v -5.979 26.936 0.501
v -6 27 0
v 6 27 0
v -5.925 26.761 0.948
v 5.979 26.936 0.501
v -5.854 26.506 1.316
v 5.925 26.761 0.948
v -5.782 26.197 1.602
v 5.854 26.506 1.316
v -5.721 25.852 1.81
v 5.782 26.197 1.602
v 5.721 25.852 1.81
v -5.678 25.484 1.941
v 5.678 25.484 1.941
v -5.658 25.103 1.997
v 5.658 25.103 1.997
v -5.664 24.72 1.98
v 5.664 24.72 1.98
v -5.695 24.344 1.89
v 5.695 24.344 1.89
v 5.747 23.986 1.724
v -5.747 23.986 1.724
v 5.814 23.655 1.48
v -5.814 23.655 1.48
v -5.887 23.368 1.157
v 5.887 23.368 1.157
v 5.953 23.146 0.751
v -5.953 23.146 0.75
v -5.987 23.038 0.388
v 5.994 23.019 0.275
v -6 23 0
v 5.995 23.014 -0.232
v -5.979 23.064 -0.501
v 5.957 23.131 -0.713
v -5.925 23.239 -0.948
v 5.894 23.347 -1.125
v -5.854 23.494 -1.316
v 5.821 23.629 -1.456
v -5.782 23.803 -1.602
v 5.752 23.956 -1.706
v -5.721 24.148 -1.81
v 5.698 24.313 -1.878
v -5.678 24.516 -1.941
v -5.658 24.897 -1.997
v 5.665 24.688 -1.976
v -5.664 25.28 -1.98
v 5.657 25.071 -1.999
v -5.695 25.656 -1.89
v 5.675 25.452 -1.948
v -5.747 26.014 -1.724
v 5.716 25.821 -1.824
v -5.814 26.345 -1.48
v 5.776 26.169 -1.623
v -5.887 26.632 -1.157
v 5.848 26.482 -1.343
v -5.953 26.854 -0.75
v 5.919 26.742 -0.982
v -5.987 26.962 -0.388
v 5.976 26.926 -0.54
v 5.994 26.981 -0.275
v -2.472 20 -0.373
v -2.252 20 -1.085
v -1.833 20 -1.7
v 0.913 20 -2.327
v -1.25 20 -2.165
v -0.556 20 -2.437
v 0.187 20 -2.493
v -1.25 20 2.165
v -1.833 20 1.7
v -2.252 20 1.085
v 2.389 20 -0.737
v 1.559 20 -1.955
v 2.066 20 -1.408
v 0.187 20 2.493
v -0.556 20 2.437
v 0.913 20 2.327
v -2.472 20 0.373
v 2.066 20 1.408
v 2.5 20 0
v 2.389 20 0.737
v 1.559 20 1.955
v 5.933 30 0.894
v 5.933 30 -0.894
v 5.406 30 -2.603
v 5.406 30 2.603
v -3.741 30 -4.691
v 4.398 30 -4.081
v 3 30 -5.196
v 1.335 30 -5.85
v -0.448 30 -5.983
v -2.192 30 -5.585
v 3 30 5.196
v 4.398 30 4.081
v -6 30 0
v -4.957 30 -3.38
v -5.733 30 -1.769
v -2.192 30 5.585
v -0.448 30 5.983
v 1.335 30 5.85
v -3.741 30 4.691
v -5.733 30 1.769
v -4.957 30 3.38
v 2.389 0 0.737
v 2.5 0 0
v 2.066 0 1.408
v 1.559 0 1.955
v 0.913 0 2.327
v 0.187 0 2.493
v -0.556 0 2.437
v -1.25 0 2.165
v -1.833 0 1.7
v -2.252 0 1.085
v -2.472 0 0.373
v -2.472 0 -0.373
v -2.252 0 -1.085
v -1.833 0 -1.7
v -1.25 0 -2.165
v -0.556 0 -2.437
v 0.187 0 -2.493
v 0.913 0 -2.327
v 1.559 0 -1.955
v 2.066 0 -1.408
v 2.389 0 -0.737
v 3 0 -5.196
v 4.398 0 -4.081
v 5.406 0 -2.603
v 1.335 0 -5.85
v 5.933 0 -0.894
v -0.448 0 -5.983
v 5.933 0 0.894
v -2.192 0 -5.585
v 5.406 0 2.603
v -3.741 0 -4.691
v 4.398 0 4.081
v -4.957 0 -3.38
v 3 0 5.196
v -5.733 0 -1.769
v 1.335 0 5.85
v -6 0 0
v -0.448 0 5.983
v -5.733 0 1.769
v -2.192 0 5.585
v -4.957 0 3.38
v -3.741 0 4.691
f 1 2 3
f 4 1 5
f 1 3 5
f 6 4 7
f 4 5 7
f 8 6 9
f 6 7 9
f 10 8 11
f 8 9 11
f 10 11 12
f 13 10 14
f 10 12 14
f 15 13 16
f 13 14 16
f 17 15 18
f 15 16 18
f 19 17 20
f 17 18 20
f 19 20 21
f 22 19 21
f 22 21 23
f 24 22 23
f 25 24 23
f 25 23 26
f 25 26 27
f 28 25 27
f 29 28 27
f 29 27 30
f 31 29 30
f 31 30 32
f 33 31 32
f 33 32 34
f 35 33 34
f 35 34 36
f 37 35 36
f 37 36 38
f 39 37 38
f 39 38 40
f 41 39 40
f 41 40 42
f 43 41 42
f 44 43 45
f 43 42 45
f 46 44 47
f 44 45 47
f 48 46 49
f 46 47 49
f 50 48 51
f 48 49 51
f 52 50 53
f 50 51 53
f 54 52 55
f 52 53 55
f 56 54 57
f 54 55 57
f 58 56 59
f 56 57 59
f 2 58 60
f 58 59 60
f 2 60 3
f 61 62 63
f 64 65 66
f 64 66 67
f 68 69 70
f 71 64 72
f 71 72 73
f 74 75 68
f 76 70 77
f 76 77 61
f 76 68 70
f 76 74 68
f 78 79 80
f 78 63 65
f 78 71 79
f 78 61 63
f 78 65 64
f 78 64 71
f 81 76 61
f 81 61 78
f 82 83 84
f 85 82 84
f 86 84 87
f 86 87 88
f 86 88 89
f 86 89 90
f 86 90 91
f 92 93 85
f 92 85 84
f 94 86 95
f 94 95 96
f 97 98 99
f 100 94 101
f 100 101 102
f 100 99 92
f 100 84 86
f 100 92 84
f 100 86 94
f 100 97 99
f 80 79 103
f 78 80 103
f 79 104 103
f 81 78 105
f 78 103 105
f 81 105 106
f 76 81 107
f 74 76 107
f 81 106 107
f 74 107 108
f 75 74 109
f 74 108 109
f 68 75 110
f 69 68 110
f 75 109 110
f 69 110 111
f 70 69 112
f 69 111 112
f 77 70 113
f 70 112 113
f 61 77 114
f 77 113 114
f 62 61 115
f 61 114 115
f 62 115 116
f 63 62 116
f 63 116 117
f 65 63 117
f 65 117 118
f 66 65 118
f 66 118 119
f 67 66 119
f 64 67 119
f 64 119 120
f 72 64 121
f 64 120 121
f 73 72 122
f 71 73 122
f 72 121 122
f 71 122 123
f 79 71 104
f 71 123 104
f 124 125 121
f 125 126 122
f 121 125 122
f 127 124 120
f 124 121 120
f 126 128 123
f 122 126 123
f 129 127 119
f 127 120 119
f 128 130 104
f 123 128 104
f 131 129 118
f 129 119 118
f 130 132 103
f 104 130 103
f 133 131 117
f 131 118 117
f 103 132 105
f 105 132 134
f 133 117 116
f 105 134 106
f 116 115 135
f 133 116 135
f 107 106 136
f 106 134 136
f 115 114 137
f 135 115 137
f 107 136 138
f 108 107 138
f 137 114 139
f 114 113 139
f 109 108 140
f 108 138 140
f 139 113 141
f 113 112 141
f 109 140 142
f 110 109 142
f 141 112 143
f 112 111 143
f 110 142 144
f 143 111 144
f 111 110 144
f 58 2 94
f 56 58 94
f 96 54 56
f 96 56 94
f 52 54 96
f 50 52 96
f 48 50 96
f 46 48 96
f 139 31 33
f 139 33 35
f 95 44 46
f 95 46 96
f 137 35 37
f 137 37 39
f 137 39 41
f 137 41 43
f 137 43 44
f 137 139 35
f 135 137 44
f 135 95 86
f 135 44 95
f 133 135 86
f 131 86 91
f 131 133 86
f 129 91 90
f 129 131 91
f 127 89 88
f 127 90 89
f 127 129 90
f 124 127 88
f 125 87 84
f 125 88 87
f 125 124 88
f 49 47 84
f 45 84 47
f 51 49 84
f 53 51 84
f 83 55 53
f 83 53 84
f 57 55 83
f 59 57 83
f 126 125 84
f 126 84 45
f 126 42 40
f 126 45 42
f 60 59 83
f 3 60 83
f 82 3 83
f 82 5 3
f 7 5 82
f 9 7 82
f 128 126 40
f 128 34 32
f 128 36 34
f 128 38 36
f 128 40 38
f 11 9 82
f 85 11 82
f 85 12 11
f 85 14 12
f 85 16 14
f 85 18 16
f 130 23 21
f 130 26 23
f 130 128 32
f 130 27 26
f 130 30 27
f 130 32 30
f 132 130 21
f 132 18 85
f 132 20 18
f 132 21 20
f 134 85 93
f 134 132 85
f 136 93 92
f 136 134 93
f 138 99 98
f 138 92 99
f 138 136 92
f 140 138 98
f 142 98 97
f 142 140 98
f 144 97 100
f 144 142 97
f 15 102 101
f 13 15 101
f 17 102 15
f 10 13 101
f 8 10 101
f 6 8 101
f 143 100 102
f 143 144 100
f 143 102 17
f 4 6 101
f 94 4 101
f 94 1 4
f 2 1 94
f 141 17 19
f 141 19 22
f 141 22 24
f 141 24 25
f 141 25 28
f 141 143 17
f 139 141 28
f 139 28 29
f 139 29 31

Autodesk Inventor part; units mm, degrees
ref_plane "YZ Plane" through (0, 0, 0) normal (1, 0, 0) x (0, 1, 0)
ref_plane "XZ Plane" through (0, 0, 0) normal (0, 1, 0) x (-1, 0, 0)
ref_plane "XY Plane" through (0, 0, 0) normal (0, 0, 1) x (1, 0, 0)
sketch "スケッチ1" plane through (0, 0, 0) normal (0, 1, 0) x (-1, 0, 0)
  circle A0 centre (0, 0) radius 6
  dimension "d0" = 12
extrude "押し出し1" add sketch "スケッチ1" along normal blind 30
sketch "スケッチ2" plane through (0, 0, 0) normal (0, -1, 0) x (1, 0, 0)
  circle A0 centre (0, 0) radius 2.5
  dimension "d3" = 5
extrude "押し出し2" cut sketch "スケッチ2" against normal blind 20
sketch "スケッチ3" plane through (0, 0, 0) normal (1, 0, 0) x (0, 1, 0)
  circle A0 centre (25, 0) radius 2
  line L0 (20, -2.5) -> (20, 2.5) projected
  point P0 (0, 0)
  dimension "d8" = 4
  dimension "d9" = 5
extrude "押し出し3" cut sketch "スケッチ3" along normal mid plane 20
properties part number "hand2_09"
